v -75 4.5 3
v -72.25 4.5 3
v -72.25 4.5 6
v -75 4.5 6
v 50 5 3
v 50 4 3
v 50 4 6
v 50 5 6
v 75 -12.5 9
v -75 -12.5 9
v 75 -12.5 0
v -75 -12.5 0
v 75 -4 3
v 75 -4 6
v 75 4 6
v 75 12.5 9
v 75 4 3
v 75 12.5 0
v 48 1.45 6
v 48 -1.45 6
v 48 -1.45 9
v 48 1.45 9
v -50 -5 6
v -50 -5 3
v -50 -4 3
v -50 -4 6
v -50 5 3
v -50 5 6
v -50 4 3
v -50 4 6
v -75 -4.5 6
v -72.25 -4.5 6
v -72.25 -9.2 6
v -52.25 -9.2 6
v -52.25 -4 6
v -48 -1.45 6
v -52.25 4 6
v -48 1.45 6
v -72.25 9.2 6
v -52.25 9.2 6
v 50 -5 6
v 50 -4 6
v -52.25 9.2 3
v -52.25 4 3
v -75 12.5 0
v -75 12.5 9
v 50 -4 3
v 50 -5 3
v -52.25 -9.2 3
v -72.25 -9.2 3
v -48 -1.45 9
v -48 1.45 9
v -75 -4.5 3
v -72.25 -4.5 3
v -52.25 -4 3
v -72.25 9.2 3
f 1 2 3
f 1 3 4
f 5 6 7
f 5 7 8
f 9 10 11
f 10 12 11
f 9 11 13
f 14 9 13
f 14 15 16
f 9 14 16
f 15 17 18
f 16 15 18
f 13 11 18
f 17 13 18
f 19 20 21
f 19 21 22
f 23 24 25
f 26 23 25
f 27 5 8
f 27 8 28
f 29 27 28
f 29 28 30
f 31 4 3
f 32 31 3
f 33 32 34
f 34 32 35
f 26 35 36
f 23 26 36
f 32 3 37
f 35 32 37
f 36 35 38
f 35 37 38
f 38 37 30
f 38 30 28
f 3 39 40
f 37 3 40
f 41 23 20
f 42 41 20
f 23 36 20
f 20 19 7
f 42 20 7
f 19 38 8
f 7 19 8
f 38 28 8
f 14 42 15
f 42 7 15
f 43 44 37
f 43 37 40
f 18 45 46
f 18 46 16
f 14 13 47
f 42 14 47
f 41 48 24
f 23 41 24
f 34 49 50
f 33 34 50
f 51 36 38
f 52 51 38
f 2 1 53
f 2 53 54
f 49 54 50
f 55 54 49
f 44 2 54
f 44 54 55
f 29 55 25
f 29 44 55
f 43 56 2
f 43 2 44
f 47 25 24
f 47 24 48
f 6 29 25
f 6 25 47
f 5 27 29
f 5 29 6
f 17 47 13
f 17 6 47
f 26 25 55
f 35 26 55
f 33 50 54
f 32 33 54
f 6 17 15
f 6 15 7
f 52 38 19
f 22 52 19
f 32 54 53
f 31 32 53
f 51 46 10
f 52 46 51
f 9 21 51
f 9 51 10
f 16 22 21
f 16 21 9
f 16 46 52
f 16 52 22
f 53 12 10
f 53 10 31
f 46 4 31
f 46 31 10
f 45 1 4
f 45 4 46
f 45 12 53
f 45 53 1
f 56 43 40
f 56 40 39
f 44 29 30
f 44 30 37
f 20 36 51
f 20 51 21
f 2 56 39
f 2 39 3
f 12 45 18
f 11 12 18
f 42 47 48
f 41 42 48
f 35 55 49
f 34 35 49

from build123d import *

# Parameters (mm, degrees)
SKETCH_W      = 150
SKETCH_H      = 25
PAD_DEPTH     = 3
PAD001_DEPTH  = 3
SKETCH004_W   = 150
SKETCH004_H   = 25
SKETCH004_W_2 = 96
SKETCH004_H_2 = 2.9
PAD002_DEPTH  = 3


with BuildPart() as part:
    # Sketch → Pad (new body)
    with BuildSketch(Plane.XY):
        Rectangle(SKETCH_W, SKETCH_H)
    extrude(amount=PAD_DEPTH)

    # Sketch001 (on Face6 of Pad) → Pad001 (join)
    with BuildSketch(Plane.XY.offset(3)):
        Polygon((-75, 12.5), (75, 12.5), (75, 4), (50, 4), (50, 5), (-50, 5), (-50, 4), (-52.25, 4), (-52.25, 9.2), (-72.25, 9.2), (-72.25, 4.5), (-75, 4.5), align=None)
        Polygon((-75, -12.5), (75, -12.5), (75, -4), (50, -4), (50, -5), (-50, -5), (-50, -4), (-52.25, -4), (-52.25, -9.2), (-72.25, -9.2), (-72.25, -4.5), (-75, -4.5), align=None)
    extrude(amount=PAD001_DEPTH)

    # Sketch004 (on Face12 of Pad001) → Pad002 (join)
    with BuildSketch(Plane.XY.offset(6)):
        Rectangle(SKETCH004_W, SKETCH004_H)
        Rectangle(SKETCH004_W_2, SKETCH004_H_2, mode=Mode.SUBTRACT)
    extrude(amount=PAD002_DEPTH)


solid = part.part
